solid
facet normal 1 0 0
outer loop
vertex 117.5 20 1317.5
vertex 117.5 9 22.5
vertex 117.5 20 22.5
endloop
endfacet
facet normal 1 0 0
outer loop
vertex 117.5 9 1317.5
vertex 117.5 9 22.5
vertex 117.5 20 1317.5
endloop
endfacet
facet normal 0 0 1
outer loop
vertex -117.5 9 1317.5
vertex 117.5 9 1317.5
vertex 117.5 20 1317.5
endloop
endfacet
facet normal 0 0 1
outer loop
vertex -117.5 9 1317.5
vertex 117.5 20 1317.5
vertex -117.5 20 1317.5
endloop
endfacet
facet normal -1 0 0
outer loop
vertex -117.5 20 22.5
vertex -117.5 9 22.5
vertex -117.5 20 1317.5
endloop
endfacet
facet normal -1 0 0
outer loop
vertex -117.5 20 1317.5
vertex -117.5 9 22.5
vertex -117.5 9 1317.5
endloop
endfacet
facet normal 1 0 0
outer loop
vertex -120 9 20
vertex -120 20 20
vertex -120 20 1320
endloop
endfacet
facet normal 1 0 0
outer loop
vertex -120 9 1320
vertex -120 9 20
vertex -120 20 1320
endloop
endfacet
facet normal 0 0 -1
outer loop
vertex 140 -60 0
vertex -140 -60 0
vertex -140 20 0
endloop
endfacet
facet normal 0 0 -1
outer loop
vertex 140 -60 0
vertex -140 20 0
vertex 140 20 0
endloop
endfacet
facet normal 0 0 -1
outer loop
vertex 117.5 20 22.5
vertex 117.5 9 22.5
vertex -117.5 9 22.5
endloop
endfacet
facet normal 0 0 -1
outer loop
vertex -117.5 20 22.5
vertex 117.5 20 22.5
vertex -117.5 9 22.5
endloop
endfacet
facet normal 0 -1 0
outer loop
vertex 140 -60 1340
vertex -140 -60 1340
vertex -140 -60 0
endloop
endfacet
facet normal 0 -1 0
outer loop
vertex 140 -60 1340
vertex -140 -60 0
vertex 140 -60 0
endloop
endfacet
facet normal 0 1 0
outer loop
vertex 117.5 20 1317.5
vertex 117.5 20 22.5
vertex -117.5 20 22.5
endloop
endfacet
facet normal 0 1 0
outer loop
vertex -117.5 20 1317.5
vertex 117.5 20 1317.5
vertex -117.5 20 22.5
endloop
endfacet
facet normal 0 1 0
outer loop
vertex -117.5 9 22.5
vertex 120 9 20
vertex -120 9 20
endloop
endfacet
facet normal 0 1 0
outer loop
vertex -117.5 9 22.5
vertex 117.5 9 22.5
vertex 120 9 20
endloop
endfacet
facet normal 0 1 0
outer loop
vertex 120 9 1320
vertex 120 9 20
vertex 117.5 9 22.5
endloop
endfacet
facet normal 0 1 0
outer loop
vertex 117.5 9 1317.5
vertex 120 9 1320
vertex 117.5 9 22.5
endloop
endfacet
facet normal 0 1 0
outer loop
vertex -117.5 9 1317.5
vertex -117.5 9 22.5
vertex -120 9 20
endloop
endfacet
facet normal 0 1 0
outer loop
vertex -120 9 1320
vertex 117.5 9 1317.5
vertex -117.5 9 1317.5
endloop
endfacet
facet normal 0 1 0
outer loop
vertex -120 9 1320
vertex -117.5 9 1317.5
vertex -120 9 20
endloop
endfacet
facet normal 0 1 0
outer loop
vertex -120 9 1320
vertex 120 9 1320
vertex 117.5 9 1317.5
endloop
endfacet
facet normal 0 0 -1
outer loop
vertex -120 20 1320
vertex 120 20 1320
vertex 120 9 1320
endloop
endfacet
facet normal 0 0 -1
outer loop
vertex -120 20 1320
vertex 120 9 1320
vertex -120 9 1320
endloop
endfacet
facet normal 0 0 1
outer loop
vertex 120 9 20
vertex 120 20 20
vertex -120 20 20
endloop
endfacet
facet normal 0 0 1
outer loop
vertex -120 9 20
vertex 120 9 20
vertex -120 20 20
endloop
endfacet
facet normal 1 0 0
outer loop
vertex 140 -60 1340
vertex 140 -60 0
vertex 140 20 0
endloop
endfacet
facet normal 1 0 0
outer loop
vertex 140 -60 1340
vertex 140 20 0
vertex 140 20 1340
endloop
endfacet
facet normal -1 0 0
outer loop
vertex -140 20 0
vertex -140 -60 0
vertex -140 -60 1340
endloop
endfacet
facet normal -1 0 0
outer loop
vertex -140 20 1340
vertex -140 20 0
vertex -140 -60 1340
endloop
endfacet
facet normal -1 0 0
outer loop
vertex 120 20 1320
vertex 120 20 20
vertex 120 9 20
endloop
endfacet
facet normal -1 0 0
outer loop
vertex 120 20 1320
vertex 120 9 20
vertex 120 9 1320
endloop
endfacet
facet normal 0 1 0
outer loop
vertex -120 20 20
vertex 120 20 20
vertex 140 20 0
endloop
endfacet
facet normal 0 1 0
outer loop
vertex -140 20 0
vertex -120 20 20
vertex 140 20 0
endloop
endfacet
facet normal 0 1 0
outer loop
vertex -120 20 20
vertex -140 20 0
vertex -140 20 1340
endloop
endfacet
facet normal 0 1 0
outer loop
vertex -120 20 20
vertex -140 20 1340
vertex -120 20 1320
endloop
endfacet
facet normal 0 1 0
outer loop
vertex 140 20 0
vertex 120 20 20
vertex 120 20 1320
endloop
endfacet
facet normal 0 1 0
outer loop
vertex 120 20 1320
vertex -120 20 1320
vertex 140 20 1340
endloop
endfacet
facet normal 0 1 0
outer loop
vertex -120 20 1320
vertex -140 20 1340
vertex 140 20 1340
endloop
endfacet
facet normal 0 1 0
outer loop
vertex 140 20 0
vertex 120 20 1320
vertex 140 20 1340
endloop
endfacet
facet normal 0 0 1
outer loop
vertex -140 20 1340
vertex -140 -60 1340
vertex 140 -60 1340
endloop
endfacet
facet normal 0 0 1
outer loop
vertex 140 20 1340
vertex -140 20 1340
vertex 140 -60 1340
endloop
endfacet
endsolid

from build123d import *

# Parameters (mm, degrees)
SKETCH1_W           = 280
SKETCH1_H           = 1340
BOSS_EXTRUDE1_DEPTH = 80
SKETCH2_W           = 240
SKETCH2_H           = 1300
CUT_EXTRUDE1_DEPTH  = 11
SKETCH3_W           = 235
SKETCH3_H           = 1295
BOSS_EXTRUDE2_DEPTH = 11


with BuildPart() as part:
    # Sketch1 → Boss-Extrude1 (new body)
    with BuildSketch(Plane.XZ.offset(60)):
        with Locations((0, 670)):
            Rectangle(SKETCH1_W, SKETCH1_H)
    extrude(amount=-BOSS_EXTRUDE1_DEPTH)

    # Sketch2 → Cut-Extrude1 (cut)
    with BuildSketch(Plane(origin=(0, 20, 0), x_dir=(-1, 0, 0), z_dir=(0, 1, 0))):
        with Locations((0, 670)):
            Rectangle(SKETCH2_W, SKETCH2_H)
    extrude(amount=-CUT_EXTRUDE1_DEPTH, mode=Mode.SUBTRACT)

    # Sketch3 → Boss-Extrude2 (add)
    with BuildSketch(Plane(origin=(0, 9, 0), x_dir=(-1, 0, 0), z_dir=(0, 1, 0))):
        with Locations((0, 670)):
            Rectangle(SKETCH3_W, SKETCH3_H)
    extrude(amount=BOSS_EXTRUDE2_DEPTH)


solid = part.part
